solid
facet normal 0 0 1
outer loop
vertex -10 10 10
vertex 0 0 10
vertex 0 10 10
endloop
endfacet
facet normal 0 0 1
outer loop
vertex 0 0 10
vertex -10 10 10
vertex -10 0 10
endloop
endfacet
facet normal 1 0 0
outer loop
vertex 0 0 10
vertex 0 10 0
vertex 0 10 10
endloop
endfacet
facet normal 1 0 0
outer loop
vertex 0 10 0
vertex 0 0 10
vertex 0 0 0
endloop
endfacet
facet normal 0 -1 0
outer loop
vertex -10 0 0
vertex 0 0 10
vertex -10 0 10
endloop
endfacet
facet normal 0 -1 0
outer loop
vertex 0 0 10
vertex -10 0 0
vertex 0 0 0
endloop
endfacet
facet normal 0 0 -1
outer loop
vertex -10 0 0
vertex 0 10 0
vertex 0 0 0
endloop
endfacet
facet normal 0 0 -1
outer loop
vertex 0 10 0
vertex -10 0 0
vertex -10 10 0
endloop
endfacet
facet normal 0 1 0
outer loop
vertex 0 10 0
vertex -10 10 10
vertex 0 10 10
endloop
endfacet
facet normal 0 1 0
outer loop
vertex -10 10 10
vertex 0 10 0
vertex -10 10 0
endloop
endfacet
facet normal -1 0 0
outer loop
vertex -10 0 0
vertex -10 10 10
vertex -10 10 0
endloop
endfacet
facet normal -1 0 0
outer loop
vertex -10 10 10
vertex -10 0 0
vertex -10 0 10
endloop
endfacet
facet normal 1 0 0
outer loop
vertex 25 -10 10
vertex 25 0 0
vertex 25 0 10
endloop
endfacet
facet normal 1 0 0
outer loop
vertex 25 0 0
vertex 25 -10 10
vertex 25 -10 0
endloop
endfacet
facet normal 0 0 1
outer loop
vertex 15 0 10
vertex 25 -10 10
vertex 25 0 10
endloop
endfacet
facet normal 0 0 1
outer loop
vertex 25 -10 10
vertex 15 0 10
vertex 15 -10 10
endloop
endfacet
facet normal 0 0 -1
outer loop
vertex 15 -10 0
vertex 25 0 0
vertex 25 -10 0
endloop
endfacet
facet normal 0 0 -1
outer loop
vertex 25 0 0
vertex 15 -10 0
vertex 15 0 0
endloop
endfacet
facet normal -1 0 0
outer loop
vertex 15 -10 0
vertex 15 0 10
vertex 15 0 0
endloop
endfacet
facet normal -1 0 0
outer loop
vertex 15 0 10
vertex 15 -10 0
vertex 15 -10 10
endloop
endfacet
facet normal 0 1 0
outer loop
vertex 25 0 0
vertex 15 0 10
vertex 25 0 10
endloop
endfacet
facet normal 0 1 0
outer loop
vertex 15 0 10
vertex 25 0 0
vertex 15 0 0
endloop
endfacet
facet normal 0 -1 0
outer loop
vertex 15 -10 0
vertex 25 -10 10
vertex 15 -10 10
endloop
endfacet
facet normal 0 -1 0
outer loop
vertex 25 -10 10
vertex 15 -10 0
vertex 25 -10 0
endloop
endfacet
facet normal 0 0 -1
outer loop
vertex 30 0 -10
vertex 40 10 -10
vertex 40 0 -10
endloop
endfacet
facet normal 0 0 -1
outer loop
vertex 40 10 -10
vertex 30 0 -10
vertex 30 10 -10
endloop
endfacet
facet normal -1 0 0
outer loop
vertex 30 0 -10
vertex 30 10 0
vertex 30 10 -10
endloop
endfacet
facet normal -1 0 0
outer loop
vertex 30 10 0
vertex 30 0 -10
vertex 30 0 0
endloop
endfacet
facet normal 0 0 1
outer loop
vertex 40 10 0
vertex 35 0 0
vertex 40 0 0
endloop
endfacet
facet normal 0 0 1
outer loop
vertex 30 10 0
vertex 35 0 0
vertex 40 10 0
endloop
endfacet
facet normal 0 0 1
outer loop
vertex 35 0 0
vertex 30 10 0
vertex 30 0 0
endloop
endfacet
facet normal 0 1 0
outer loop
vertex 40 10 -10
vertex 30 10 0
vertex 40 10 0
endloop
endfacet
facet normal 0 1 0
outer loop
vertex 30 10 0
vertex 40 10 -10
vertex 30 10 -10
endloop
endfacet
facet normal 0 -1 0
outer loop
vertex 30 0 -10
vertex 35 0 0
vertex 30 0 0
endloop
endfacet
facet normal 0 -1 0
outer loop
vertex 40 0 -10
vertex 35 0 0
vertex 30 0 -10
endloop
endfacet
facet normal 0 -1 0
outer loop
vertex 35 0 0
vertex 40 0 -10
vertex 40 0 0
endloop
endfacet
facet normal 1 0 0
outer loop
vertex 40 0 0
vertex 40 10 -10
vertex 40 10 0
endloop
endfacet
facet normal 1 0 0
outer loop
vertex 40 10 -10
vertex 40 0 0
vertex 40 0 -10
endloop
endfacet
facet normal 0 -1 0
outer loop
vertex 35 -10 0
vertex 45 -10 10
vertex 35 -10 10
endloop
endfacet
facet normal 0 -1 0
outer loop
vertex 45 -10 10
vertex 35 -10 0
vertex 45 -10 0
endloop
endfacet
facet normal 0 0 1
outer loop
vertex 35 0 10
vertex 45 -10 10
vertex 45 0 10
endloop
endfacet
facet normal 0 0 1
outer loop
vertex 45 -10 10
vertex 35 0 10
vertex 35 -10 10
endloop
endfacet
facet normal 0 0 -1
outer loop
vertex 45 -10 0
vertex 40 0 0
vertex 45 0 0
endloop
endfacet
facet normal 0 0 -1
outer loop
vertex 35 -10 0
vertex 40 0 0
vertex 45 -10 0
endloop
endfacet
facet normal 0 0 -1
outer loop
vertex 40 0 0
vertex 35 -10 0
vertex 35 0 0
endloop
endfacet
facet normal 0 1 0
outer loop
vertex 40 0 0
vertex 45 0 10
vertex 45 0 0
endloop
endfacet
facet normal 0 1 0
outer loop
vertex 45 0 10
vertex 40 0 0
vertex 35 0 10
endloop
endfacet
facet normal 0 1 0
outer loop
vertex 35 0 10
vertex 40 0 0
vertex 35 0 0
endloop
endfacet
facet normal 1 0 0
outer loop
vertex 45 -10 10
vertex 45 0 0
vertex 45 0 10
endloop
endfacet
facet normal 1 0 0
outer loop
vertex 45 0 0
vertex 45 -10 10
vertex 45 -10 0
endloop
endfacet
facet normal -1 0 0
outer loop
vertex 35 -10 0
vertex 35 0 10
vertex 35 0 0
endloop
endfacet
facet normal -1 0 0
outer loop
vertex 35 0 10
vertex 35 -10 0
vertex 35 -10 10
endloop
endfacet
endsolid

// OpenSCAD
// Mirror transformation tests
union() {
    mirror([1, 0, 0]) cube([10, 10, 10]);
    translate([15, 0, 0]) mirror([0, 1, 0]) cube([10, 10, 10]);
    translate([30, 0, 0]) mirror([0, 0, 1]) cube([10, 10, 10]);
    translate([45, 0, 0]) mirror([1, 1, 0]) cube([10, 10, 10]);
}
